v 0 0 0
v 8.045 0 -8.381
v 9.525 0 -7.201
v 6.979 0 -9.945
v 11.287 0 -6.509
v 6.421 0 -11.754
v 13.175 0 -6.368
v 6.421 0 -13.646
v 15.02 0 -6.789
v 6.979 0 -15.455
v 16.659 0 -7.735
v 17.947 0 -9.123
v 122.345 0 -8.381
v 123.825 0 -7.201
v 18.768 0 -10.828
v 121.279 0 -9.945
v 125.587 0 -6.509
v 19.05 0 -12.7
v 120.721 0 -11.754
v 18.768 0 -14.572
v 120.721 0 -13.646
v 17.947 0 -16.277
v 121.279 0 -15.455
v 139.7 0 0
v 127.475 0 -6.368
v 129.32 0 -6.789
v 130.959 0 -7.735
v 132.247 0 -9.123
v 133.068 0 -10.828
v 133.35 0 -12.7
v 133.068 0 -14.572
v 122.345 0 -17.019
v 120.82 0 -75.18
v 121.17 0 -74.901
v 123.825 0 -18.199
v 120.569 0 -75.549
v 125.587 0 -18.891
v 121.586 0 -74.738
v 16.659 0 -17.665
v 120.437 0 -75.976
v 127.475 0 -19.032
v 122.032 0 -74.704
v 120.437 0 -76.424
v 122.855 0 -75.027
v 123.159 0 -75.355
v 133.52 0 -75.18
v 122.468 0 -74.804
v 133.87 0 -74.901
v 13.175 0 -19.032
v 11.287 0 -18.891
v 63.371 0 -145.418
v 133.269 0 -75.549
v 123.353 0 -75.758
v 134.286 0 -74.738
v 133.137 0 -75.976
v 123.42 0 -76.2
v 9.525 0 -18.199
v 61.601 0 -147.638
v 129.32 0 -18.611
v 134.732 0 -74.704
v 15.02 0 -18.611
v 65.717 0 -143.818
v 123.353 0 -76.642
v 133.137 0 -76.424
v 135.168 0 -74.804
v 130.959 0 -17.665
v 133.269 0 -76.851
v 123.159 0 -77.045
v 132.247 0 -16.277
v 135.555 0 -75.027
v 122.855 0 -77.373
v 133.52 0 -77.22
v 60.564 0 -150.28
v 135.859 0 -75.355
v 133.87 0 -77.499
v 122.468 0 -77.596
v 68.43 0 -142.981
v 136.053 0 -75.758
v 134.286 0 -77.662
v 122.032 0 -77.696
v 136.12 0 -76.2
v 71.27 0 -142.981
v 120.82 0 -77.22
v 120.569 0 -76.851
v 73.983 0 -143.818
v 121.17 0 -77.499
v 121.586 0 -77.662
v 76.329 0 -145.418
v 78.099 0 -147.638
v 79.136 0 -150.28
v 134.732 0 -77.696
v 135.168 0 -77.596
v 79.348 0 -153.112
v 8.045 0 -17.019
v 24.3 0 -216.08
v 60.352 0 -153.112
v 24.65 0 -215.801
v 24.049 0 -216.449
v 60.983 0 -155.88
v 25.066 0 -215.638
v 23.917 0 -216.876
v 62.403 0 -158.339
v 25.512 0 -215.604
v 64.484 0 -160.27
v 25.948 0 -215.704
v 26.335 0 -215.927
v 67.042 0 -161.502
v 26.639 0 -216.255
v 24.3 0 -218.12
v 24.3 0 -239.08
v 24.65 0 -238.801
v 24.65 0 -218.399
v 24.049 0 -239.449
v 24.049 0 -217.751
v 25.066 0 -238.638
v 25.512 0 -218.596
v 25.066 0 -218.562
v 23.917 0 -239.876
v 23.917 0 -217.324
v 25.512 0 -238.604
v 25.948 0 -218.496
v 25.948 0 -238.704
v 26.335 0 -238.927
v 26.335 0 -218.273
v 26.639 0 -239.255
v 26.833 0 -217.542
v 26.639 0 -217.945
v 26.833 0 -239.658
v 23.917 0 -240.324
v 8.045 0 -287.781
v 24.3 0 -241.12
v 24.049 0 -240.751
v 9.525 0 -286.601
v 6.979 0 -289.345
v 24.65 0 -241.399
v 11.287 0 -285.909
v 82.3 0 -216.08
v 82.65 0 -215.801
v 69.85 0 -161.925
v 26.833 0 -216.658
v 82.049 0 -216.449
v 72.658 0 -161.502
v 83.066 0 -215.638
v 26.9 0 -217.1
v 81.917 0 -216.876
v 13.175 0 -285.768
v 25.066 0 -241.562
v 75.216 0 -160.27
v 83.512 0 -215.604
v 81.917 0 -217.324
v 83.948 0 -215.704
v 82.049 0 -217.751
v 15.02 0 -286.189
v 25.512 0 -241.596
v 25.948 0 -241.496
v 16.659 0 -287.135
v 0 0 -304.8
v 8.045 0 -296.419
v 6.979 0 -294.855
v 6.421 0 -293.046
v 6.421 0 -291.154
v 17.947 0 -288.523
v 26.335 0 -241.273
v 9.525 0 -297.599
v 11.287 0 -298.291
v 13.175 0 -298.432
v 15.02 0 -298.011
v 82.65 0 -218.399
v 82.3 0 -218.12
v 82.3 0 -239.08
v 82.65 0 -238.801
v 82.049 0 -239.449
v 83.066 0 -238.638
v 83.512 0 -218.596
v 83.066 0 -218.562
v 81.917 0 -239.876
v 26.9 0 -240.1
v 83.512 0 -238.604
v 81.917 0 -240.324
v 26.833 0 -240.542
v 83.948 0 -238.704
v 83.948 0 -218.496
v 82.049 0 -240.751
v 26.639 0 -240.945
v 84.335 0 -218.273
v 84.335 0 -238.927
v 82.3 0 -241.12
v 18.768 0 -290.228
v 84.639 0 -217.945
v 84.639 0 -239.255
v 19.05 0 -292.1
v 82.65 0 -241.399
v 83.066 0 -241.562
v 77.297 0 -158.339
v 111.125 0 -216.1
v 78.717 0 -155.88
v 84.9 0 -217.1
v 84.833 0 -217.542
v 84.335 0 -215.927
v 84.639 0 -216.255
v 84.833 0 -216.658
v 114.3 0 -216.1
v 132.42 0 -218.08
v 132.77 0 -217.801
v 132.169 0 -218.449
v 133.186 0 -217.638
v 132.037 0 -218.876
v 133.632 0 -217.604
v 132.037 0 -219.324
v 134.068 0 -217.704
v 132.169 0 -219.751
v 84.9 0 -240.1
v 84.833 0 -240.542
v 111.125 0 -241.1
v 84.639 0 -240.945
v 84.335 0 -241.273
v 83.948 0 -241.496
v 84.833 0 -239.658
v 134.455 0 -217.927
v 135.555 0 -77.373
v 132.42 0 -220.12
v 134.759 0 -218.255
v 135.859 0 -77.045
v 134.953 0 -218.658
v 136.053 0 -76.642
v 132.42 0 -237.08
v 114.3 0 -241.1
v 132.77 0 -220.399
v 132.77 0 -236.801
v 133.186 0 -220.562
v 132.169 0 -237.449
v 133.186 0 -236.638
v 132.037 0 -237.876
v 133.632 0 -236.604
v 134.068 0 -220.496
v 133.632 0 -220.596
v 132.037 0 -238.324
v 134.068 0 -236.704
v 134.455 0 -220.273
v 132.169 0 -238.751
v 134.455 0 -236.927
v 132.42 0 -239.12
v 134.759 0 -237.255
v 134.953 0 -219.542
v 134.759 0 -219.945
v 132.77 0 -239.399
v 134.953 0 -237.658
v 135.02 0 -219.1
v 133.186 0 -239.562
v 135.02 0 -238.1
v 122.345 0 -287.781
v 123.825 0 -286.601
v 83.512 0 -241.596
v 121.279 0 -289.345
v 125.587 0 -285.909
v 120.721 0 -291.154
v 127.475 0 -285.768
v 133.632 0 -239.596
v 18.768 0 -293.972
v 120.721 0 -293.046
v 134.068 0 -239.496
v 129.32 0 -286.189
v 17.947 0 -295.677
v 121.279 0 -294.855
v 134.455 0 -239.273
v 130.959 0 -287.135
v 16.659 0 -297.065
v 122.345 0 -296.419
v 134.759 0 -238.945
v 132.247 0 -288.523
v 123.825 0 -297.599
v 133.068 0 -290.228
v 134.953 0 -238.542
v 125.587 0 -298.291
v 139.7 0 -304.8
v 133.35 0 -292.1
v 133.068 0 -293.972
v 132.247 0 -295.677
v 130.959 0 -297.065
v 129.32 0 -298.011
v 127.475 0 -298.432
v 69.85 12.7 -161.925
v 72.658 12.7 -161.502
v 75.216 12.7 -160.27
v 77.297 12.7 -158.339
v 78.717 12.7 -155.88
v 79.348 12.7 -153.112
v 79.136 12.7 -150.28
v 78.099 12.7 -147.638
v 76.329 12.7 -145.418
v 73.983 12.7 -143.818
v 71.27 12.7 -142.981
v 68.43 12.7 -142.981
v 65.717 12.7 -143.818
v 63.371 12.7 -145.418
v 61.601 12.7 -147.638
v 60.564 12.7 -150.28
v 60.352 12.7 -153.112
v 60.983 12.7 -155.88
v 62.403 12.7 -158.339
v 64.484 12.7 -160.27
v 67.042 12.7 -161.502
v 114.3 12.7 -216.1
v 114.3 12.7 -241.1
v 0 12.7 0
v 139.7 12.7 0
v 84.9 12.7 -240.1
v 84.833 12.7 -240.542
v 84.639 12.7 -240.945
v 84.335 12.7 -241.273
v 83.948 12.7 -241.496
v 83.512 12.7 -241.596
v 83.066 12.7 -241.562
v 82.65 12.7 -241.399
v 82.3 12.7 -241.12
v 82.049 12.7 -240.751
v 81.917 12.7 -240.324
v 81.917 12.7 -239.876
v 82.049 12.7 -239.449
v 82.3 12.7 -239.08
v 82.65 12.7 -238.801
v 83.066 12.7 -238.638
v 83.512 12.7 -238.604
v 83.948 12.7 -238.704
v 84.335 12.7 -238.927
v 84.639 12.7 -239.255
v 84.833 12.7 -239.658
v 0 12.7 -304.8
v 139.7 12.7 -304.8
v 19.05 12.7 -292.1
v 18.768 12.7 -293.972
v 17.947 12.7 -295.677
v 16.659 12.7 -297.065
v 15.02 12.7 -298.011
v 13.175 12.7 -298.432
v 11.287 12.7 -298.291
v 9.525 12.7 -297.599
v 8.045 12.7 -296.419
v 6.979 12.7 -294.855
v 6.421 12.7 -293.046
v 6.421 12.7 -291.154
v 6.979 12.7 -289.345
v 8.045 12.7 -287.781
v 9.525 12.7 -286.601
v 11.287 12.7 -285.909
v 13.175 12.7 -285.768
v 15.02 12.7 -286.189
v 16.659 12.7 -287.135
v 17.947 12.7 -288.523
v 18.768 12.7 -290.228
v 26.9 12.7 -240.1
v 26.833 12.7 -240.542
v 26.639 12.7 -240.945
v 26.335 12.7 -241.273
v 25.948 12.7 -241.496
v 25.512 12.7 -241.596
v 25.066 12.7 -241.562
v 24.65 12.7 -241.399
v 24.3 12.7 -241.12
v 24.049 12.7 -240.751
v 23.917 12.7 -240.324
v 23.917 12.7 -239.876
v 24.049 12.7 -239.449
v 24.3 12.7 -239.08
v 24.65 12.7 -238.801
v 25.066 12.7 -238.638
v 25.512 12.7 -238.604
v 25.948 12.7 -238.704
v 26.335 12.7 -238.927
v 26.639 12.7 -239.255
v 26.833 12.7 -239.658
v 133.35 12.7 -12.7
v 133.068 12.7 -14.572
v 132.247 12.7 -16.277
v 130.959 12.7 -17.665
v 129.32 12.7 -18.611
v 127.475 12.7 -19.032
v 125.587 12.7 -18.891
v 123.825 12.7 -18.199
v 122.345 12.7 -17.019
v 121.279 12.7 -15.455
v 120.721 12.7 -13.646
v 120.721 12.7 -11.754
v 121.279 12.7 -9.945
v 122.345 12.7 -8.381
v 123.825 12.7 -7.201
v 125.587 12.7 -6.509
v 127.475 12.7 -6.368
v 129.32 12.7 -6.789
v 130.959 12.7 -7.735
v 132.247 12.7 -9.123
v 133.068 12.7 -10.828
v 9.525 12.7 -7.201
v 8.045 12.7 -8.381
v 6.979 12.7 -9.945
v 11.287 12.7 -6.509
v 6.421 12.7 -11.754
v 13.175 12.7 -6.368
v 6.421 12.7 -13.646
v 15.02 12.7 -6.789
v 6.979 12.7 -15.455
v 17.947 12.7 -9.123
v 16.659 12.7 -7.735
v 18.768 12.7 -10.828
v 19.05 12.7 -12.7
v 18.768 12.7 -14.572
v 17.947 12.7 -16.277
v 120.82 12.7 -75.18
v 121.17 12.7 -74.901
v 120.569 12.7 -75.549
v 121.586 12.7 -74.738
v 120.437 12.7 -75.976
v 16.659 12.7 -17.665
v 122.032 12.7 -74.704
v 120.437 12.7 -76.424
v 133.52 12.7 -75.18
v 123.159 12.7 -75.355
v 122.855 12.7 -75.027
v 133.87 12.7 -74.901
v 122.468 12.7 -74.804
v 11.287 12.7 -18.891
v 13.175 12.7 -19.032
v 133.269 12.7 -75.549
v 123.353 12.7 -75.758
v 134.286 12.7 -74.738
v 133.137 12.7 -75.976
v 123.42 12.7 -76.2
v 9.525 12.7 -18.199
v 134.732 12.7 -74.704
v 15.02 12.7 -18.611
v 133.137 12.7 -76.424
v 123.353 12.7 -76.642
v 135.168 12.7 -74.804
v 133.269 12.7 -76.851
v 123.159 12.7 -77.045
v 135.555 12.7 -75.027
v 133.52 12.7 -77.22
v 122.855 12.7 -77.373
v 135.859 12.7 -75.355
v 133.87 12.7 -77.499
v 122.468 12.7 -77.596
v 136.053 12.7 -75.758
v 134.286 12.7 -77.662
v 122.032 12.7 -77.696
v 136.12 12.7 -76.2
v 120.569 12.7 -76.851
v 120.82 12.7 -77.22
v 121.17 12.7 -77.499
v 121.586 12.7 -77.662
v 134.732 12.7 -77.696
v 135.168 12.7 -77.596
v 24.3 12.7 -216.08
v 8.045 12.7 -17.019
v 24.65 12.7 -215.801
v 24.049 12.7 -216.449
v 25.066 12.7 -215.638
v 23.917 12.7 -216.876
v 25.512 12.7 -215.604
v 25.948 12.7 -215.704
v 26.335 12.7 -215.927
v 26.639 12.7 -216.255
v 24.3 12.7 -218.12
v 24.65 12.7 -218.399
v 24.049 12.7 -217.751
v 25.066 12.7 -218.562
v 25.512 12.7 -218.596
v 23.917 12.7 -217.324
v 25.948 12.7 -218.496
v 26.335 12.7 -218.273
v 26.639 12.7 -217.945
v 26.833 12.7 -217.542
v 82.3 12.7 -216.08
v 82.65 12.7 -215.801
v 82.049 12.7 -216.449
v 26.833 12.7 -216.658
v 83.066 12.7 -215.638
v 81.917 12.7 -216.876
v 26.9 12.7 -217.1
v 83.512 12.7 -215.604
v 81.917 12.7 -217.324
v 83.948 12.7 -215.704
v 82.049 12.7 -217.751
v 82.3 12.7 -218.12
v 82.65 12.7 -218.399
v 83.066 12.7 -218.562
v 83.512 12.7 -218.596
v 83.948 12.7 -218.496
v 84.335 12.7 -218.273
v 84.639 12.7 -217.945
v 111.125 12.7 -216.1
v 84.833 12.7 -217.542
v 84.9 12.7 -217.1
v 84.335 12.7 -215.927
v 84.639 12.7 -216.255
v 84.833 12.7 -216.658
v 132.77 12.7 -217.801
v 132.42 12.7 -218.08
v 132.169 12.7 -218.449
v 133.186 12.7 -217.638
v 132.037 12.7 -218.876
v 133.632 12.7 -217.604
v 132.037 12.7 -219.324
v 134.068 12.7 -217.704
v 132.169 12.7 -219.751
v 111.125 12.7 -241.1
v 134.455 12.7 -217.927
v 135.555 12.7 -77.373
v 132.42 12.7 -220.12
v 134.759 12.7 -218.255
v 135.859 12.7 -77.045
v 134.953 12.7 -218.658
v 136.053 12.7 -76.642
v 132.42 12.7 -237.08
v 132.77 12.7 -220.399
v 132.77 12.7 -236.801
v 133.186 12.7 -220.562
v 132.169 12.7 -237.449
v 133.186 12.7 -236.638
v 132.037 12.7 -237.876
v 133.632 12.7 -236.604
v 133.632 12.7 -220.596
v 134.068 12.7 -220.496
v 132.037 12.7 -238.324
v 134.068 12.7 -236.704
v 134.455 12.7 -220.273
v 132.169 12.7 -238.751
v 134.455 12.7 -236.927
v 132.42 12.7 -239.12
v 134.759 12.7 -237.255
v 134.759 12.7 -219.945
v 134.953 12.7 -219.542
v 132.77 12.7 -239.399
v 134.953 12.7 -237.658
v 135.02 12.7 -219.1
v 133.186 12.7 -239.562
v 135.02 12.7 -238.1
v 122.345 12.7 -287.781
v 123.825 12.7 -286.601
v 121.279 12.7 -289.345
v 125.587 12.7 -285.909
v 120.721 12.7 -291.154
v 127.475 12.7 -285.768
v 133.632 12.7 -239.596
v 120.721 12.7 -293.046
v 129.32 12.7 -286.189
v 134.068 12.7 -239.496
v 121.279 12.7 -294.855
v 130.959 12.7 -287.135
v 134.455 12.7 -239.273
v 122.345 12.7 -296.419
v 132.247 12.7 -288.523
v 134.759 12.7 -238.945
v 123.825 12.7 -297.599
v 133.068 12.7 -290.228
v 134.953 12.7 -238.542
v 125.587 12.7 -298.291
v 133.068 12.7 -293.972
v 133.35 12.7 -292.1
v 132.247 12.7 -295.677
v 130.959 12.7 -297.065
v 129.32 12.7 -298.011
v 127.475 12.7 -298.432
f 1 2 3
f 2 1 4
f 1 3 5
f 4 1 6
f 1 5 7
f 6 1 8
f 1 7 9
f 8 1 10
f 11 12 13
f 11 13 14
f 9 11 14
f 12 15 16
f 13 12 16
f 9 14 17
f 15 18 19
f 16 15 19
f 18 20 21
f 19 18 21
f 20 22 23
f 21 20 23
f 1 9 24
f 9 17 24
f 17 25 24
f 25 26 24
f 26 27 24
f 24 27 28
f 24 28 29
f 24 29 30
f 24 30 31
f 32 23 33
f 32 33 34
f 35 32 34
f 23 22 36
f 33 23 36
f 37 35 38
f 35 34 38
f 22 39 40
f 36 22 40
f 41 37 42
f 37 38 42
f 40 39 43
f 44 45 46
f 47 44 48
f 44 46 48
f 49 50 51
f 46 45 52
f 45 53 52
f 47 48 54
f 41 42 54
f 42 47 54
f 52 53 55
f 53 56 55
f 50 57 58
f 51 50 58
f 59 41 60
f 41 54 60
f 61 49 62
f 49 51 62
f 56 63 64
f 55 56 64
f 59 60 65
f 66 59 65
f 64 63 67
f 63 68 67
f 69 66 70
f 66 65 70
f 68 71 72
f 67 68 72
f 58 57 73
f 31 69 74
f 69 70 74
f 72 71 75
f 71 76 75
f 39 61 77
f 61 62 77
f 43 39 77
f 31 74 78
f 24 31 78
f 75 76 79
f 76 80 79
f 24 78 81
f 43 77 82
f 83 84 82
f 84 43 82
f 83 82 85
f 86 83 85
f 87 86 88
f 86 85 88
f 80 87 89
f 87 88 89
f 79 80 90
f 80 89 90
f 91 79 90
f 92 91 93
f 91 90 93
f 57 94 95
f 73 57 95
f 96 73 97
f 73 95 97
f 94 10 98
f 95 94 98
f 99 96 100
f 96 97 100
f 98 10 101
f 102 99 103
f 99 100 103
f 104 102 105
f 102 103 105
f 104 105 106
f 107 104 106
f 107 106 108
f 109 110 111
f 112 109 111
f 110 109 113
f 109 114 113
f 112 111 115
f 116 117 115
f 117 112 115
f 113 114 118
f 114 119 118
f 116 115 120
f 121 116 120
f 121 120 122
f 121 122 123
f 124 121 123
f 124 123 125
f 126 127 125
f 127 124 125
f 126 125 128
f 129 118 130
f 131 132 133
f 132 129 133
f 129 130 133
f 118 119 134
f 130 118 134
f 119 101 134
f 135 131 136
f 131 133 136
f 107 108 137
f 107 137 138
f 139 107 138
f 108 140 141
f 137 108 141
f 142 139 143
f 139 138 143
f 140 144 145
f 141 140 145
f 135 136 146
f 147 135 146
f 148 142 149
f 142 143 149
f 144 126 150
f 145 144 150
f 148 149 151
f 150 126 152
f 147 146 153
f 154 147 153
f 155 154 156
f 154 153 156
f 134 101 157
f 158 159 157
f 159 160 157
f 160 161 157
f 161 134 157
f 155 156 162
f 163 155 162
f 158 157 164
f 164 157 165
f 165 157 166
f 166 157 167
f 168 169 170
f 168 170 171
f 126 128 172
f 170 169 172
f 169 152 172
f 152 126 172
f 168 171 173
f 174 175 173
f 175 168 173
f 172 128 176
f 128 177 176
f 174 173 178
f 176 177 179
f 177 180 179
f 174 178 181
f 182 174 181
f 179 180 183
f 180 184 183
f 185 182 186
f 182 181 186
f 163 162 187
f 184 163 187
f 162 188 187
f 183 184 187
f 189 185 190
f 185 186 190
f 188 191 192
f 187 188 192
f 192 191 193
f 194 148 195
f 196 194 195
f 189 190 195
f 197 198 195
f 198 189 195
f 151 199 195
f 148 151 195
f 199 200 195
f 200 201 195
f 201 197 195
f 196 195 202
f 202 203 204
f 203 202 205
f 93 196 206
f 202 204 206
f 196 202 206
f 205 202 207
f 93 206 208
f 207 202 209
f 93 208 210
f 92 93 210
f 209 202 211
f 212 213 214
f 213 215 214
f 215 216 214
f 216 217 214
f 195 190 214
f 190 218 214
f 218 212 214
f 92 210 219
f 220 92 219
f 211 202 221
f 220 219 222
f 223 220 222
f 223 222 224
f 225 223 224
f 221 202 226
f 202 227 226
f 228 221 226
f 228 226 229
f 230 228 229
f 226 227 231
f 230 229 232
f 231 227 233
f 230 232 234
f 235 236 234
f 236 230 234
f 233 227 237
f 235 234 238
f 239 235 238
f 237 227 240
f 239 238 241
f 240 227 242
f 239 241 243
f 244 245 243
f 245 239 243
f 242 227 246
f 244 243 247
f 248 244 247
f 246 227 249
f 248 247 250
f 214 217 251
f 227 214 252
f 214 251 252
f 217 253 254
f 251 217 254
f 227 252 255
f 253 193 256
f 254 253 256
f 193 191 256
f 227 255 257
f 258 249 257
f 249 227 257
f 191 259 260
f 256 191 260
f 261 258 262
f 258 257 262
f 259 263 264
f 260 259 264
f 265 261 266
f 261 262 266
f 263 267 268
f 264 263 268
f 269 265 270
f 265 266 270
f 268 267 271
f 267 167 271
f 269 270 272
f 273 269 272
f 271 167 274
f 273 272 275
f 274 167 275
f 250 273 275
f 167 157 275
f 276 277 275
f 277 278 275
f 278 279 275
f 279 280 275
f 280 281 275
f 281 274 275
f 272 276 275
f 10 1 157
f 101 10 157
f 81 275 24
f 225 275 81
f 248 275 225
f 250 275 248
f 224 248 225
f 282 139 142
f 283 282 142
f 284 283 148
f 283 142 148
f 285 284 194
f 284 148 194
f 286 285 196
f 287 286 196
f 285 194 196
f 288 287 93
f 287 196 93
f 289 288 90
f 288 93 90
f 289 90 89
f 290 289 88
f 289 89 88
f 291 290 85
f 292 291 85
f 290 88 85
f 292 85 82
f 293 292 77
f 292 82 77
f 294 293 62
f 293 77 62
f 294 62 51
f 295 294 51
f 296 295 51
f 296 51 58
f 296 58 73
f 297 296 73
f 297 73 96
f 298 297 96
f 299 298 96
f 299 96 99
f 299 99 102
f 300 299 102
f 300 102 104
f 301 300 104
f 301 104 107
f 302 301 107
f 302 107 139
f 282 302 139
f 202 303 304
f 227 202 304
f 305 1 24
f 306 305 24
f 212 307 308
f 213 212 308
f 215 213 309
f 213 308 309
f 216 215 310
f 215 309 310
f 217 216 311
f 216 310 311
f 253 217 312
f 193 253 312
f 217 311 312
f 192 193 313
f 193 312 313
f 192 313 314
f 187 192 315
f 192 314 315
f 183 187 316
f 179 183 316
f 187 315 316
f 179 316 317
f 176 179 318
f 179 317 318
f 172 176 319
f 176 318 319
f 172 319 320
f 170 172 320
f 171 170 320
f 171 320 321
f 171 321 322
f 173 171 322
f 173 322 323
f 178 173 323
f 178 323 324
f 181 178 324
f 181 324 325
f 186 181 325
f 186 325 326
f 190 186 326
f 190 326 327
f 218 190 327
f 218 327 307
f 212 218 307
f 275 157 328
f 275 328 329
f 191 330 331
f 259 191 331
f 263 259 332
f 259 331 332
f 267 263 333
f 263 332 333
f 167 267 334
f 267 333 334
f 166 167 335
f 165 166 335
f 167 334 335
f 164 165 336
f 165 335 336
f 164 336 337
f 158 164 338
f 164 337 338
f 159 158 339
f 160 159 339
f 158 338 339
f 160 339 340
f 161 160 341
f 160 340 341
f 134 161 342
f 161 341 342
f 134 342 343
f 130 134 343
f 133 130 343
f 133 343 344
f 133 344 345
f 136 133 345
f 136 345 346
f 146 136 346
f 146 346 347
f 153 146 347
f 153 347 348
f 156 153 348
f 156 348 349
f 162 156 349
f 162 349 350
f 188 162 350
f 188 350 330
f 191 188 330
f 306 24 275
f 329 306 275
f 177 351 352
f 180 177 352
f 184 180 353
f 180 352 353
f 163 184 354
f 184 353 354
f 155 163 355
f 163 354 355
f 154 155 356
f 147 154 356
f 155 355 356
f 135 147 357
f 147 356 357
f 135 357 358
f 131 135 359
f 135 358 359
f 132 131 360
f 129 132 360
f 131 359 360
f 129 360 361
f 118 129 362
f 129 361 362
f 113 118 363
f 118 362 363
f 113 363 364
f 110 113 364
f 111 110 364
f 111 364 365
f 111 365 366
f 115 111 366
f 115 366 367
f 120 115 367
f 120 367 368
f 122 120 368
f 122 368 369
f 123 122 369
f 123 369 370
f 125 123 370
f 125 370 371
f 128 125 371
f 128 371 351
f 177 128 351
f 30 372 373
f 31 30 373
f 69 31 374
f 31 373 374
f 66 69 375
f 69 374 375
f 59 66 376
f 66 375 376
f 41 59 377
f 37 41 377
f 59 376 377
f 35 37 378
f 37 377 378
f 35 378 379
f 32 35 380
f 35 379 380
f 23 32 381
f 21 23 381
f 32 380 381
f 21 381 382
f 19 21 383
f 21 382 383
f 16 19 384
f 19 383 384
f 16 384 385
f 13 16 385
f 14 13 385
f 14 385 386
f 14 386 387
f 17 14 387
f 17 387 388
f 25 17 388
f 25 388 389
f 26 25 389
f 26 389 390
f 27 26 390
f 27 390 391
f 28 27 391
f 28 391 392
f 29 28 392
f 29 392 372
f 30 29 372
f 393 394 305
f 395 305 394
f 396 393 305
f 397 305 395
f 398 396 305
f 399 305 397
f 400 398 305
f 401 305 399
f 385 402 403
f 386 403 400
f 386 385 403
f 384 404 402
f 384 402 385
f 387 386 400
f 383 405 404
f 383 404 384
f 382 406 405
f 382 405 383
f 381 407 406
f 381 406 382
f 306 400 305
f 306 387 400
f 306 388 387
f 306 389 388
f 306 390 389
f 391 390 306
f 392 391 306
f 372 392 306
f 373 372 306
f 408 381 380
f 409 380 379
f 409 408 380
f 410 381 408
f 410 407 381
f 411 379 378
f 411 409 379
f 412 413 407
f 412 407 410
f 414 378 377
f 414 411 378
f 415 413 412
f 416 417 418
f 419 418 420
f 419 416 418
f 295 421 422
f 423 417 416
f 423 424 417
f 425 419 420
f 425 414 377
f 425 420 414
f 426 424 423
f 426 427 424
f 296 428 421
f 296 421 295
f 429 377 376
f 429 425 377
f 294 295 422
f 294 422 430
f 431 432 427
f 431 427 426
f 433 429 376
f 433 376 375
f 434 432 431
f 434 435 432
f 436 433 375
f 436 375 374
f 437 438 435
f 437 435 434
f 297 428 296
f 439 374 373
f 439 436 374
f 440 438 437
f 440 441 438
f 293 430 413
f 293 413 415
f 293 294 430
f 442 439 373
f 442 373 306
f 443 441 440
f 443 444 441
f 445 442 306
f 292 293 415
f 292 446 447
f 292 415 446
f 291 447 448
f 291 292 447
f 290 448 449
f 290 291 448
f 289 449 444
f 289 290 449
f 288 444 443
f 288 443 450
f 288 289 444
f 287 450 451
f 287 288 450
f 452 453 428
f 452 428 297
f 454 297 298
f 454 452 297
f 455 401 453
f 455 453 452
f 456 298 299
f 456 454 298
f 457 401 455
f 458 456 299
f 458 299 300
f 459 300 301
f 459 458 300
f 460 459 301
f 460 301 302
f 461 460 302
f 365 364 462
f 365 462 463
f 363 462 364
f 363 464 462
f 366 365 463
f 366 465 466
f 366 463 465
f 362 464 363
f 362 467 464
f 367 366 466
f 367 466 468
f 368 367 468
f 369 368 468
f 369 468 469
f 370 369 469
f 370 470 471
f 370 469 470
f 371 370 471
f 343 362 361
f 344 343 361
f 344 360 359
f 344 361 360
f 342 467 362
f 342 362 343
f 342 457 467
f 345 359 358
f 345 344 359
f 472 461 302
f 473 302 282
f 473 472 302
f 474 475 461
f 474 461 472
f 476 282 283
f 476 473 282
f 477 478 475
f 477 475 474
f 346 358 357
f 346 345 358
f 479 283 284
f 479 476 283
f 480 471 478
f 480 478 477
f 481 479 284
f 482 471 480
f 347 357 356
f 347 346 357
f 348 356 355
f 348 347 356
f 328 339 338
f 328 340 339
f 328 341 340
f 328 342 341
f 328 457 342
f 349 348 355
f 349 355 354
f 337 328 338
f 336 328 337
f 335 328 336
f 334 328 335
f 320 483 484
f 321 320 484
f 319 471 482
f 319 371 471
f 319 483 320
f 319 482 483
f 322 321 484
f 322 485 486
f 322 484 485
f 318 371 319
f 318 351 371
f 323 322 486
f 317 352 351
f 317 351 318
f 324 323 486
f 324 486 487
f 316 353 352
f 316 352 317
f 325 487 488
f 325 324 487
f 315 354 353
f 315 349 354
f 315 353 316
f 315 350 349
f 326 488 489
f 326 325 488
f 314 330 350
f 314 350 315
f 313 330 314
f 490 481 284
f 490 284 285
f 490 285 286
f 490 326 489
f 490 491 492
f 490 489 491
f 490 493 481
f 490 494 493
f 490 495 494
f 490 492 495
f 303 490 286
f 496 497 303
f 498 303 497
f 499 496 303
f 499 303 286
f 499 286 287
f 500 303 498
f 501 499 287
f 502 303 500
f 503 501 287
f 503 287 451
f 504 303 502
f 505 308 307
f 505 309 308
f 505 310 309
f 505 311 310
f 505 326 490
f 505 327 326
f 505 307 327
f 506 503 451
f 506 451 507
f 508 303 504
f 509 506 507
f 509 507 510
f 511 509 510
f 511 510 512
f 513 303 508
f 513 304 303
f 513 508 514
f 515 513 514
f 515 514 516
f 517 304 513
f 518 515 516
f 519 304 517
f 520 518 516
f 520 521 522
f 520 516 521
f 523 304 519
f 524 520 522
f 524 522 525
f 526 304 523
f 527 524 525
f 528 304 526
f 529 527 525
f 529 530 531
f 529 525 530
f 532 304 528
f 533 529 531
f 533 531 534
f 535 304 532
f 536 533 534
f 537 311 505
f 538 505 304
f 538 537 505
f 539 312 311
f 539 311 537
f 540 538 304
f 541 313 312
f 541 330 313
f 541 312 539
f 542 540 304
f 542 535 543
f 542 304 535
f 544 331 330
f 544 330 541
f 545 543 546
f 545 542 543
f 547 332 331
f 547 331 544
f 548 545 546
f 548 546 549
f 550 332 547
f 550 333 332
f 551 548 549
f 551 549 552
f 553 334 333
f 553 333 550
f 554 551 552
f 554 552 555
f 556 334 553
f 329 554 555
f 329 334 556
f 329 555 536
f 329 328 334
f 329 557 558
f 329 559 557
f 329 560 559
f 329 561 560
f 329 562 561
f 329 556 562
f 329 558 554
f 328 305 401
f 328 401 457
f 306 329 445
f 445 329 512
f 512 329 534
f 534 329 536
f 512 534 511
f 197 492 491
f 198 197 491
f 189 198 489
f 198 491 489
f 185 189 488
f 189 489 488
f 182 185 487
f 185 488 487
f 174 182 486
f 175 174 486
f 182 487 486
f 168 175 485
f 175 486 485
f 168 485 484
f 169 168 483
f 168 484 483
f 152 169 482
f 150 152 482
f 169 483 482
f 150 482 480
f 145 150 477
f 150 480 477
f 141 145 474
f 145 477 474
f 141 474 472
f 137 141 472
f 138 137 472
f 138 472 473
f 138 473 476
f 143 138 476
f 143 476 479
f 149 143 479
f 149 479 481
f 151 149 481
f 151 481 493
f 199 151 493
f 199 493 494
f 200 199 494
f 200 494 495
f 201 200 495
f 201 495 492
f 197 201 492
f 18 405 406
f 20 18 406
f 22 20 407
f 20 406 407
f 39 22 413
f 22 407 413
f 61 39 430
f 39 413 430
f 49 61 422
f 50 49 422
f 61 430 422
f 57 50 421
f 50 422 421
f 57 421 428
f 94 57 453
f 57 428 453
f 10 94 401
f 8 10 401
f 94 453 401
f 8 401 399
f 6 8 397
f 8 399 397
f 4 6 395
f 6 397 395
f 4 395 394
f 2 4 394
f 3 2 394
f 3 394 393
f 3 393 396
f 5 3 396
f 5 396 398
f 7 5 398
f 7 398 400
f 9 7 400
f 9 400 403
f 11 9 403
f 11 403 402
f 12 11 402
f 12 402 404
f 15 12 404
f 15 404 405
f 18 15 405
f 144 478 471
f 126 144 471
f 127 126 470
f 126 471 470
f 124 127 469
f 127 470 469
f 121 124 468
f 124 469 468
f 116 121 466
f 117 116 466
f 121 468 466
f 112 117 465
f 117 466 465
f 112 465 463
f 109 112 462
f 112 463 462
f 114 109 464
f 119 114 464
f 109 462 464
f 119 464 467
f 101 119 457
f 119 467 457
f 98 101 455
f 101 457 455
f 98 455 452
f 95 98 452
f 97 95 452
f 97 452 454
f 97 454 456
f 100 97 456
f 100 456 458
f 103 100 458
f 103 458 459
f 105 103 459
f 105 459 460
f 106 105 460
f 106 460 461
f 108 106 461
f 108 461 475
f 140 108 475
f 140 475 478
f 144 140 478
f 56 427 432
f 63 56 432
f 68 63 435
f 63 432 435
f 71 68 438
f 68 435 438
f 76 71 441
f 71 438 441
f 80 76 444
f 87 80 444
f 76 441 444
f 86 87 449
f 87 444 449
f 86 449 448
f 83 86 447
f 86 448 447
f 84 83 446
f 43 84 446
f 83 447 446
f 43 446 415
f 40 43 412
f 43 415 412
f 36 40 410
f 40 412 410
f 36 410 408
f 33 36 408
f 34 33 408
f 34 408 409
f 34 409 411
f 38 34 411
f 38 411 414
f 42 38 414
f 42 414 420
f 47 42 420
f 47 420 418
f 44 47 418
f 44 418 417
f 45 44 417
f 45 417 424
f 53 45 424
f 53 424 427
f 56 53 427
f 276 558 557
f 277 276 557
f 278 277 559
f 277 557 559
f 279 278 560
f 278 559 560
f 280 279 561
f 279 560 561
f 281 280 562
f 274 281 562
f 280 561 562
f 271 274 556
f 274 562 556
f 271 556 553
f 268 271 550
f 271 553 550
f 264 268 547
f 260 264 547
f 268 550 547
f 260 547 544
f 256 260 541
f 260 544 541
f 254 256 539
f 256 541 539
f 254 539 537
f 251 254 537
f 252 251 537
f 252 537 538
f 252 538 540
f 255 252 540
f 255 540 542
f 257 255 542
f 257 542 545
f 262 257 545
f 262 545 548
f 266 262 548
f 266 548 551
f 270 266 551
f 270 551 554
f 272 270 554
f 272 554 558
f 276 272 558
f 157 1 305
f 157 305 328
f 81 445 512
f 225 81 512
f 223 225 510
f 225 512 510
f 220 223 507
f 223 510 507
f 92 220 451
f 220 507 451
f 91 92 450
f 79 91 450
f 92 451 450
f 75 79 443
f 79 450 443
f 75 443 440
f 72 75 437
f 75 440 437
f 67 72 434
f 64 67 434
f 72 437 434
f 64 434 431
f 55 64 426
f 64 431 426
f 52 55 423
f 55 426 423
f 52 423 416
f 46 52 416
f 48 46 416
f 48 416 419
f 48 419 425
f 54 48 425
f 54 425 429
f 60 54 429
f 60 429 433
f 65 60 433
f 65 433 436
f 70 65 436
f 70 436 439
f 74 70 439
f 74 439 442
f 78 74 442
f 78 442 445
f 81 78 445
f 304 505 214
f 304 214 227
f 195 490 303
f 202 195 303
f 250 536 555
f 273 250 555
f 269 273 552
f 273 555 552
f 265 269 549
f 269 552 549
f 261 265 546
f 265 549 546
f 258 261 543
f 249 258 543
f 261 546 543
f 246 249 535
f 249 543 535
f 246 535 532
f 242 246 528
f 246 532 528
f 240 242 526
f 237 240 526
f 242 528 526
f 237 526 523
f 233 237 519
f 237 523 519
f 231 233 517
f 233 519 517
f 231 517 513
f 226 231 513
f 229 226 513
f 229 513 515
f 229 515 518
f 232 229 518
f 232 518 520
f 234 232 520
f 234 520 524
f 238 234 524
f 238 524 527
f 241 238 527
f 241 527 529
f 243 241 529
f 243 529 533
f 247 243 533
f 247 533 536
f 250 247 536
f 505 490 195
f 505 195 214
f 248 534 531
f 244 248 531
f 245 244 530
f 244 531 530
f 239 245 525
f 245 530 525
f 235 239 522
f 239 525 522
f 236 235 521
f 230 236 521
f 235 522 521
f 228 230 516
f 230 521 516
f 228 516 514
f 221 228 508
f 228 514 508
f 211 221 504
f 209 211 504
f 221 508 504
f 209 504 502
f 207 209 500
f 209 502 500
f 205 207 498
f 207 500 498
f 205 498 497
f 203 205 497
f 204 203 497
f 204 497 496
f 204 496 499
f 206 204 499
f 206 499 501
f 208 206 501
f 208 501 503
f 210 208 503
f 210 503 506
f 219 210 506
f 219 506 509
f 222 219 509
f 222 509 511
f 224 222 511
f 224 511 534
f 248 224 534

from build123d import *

# Parameters (mm, degrees)
SKETCH1_W                      = 139.7
SKETCH1_H                      = 304.8
BOSS_EXTRUDE1_DEPTH            = 12.7
SKETCH5_R                      = 6.35
CUT_EXTRUDE2_DEPTH             = 13.7
F_3_4_0_7500_DOWEL_HOLE1_D     = 19.05
F_3_4_0_7500_DOWEL_HOLE1_DEPTH = 25.4
F_3_4_0_7500_DOWEL_HOLE1_TIP   = 5.723197396
SKETCH10_R                     = 1.5
CUT_EXTRUDE3_DEPTH             = 13.7
SKETCH11_R                     = 1.5
CUT_EXTRUDE4_DEPTH             = 13.7
SKETCH12_R                     = 1.5
SKETCH12_W                     = 3.175
SKETCH12_H                     = 25
CUT_EXTRUDE6_DEPTH             = 13.7


with BuildPart() as part:
    # Sketch1 → Boss-Extrude1 (new body)
    with BuildSketch(Plane(origin=(0, 0, 0), x_dir=(1, 0, 0), z_dir=(0, 1, 0))):
        with Locations((69.85, 152.4)):
            Rectangle(SKETCH1_W, SKETCH1_H)
    extrude(amount=BOSS_EXTRUDE1_DEPTH)

    # Sketch5 → Cut-Extrude2 (cut, through all)
    with BuildSketch(Plane(origin=(0, 12.7, 0), x_dir=(1, 0, 0), z_dir=(0, 1, 0))):
        with Locations((12.7, 12.7)):
            Circle(SKETCH5_R)
        with Locations((127, 12.7)):
            Circle(SKETCH5_R)
        with Locations((127, 292.1)):
            Circle(SKETCH5_R)
        with Locations((12.7, 292.1)):
            Circle(SKETCH5_R)
    extrude(amount=-CUT_EXTRUDE2_DEPTH, mode=Mode.SUBTRACT)

    # 3/4 (0.7500) Dowel Hole1
    with Locations(Plane(origin=(69.85, 12.7, -152.4), x_dir=(0, 0, 1), z_dir=(0, 1, 0))):
        with Locations((0, 0)):
            Hole(F_3_4_0_7500_DOWEL_HOLE1_D / 2, depth=F_3_4_0_7500_DOWEL_HOLE1_DEPTH)
            with Locations((0, 0, -(F_3_4_0_7500_DOWEL_HOLE1_DEPTH + F_3_4_0_7500_DOWEL_HOLE1_TIP / 2))):  # 118° drill point
                Cone(0, F_3_4_0_7500_DOWEL_HOLE1_D / 2, F_3_4_0_7500_DOWEL_HOLE1_TIP, mode=Mode.SUBTRACT)

    # Sketch10 → Cut-Extrude3 (cut, through all)
    with BuildSketch(Plane(origin=(0, 12.7, 0), x_dir=(1, 0, 0), z_dir=(0, 1, 0))):
        with Locations((25.4, 217.0999976)):
            Circle(SKETCH10_R)
        with Locations((25.4, 240.1000024)):
            Circle(SKETCH10_R)
        with Locations((83.400011, 240.1000024)):
            Circle(SKETCH10_R)
        with Locations((83.400011, 217.0999976)):
            Circle(SKETCH10_R)
    extrude(amount=-CUT_EXTRUDE3_DEPTH, mode=Mode.SUBTRACT)

    # Sketch11 → Cut-Extrude4 (cut, through all)
    with BuildSketch(Plane(origin=(0, 12.7, 0), x_dir=(1, 0, 0), z_dir=(0, 1, 0))):
        with Locations((134.62, 76.2)):
            Circle(SKETCH11_R)
        with Locations((121.92, 76.2)):
            Circle(SKETCH11_R)
    extrude(amount=-CUT_EXTRUDE4_DEPTH, mode=Mode.SUBTRACT)

    # Sketch12 → Cut-Extrude6 (cut, through all)
    with BuildSketch(Plane(origin=(0, 12.7, 0), x_dir=(1, 0, 0), z_dir=(0, 1, 0))):
        with Locations((133.52, 219.09999995)):
            Circle(SKETCH12_R)
        with Locations((133.52, 238.10000005)):
            Circle(SKETCH12_R)
        with Locations((112.7125, 228.6)):
            Rectangle(SKETCH12_W, SKETCH12_H)
    extrude(amount=-CUT_EXTRUDE6_DEPTH, mode=Mode.SUBTRACT)


solid = part.part
